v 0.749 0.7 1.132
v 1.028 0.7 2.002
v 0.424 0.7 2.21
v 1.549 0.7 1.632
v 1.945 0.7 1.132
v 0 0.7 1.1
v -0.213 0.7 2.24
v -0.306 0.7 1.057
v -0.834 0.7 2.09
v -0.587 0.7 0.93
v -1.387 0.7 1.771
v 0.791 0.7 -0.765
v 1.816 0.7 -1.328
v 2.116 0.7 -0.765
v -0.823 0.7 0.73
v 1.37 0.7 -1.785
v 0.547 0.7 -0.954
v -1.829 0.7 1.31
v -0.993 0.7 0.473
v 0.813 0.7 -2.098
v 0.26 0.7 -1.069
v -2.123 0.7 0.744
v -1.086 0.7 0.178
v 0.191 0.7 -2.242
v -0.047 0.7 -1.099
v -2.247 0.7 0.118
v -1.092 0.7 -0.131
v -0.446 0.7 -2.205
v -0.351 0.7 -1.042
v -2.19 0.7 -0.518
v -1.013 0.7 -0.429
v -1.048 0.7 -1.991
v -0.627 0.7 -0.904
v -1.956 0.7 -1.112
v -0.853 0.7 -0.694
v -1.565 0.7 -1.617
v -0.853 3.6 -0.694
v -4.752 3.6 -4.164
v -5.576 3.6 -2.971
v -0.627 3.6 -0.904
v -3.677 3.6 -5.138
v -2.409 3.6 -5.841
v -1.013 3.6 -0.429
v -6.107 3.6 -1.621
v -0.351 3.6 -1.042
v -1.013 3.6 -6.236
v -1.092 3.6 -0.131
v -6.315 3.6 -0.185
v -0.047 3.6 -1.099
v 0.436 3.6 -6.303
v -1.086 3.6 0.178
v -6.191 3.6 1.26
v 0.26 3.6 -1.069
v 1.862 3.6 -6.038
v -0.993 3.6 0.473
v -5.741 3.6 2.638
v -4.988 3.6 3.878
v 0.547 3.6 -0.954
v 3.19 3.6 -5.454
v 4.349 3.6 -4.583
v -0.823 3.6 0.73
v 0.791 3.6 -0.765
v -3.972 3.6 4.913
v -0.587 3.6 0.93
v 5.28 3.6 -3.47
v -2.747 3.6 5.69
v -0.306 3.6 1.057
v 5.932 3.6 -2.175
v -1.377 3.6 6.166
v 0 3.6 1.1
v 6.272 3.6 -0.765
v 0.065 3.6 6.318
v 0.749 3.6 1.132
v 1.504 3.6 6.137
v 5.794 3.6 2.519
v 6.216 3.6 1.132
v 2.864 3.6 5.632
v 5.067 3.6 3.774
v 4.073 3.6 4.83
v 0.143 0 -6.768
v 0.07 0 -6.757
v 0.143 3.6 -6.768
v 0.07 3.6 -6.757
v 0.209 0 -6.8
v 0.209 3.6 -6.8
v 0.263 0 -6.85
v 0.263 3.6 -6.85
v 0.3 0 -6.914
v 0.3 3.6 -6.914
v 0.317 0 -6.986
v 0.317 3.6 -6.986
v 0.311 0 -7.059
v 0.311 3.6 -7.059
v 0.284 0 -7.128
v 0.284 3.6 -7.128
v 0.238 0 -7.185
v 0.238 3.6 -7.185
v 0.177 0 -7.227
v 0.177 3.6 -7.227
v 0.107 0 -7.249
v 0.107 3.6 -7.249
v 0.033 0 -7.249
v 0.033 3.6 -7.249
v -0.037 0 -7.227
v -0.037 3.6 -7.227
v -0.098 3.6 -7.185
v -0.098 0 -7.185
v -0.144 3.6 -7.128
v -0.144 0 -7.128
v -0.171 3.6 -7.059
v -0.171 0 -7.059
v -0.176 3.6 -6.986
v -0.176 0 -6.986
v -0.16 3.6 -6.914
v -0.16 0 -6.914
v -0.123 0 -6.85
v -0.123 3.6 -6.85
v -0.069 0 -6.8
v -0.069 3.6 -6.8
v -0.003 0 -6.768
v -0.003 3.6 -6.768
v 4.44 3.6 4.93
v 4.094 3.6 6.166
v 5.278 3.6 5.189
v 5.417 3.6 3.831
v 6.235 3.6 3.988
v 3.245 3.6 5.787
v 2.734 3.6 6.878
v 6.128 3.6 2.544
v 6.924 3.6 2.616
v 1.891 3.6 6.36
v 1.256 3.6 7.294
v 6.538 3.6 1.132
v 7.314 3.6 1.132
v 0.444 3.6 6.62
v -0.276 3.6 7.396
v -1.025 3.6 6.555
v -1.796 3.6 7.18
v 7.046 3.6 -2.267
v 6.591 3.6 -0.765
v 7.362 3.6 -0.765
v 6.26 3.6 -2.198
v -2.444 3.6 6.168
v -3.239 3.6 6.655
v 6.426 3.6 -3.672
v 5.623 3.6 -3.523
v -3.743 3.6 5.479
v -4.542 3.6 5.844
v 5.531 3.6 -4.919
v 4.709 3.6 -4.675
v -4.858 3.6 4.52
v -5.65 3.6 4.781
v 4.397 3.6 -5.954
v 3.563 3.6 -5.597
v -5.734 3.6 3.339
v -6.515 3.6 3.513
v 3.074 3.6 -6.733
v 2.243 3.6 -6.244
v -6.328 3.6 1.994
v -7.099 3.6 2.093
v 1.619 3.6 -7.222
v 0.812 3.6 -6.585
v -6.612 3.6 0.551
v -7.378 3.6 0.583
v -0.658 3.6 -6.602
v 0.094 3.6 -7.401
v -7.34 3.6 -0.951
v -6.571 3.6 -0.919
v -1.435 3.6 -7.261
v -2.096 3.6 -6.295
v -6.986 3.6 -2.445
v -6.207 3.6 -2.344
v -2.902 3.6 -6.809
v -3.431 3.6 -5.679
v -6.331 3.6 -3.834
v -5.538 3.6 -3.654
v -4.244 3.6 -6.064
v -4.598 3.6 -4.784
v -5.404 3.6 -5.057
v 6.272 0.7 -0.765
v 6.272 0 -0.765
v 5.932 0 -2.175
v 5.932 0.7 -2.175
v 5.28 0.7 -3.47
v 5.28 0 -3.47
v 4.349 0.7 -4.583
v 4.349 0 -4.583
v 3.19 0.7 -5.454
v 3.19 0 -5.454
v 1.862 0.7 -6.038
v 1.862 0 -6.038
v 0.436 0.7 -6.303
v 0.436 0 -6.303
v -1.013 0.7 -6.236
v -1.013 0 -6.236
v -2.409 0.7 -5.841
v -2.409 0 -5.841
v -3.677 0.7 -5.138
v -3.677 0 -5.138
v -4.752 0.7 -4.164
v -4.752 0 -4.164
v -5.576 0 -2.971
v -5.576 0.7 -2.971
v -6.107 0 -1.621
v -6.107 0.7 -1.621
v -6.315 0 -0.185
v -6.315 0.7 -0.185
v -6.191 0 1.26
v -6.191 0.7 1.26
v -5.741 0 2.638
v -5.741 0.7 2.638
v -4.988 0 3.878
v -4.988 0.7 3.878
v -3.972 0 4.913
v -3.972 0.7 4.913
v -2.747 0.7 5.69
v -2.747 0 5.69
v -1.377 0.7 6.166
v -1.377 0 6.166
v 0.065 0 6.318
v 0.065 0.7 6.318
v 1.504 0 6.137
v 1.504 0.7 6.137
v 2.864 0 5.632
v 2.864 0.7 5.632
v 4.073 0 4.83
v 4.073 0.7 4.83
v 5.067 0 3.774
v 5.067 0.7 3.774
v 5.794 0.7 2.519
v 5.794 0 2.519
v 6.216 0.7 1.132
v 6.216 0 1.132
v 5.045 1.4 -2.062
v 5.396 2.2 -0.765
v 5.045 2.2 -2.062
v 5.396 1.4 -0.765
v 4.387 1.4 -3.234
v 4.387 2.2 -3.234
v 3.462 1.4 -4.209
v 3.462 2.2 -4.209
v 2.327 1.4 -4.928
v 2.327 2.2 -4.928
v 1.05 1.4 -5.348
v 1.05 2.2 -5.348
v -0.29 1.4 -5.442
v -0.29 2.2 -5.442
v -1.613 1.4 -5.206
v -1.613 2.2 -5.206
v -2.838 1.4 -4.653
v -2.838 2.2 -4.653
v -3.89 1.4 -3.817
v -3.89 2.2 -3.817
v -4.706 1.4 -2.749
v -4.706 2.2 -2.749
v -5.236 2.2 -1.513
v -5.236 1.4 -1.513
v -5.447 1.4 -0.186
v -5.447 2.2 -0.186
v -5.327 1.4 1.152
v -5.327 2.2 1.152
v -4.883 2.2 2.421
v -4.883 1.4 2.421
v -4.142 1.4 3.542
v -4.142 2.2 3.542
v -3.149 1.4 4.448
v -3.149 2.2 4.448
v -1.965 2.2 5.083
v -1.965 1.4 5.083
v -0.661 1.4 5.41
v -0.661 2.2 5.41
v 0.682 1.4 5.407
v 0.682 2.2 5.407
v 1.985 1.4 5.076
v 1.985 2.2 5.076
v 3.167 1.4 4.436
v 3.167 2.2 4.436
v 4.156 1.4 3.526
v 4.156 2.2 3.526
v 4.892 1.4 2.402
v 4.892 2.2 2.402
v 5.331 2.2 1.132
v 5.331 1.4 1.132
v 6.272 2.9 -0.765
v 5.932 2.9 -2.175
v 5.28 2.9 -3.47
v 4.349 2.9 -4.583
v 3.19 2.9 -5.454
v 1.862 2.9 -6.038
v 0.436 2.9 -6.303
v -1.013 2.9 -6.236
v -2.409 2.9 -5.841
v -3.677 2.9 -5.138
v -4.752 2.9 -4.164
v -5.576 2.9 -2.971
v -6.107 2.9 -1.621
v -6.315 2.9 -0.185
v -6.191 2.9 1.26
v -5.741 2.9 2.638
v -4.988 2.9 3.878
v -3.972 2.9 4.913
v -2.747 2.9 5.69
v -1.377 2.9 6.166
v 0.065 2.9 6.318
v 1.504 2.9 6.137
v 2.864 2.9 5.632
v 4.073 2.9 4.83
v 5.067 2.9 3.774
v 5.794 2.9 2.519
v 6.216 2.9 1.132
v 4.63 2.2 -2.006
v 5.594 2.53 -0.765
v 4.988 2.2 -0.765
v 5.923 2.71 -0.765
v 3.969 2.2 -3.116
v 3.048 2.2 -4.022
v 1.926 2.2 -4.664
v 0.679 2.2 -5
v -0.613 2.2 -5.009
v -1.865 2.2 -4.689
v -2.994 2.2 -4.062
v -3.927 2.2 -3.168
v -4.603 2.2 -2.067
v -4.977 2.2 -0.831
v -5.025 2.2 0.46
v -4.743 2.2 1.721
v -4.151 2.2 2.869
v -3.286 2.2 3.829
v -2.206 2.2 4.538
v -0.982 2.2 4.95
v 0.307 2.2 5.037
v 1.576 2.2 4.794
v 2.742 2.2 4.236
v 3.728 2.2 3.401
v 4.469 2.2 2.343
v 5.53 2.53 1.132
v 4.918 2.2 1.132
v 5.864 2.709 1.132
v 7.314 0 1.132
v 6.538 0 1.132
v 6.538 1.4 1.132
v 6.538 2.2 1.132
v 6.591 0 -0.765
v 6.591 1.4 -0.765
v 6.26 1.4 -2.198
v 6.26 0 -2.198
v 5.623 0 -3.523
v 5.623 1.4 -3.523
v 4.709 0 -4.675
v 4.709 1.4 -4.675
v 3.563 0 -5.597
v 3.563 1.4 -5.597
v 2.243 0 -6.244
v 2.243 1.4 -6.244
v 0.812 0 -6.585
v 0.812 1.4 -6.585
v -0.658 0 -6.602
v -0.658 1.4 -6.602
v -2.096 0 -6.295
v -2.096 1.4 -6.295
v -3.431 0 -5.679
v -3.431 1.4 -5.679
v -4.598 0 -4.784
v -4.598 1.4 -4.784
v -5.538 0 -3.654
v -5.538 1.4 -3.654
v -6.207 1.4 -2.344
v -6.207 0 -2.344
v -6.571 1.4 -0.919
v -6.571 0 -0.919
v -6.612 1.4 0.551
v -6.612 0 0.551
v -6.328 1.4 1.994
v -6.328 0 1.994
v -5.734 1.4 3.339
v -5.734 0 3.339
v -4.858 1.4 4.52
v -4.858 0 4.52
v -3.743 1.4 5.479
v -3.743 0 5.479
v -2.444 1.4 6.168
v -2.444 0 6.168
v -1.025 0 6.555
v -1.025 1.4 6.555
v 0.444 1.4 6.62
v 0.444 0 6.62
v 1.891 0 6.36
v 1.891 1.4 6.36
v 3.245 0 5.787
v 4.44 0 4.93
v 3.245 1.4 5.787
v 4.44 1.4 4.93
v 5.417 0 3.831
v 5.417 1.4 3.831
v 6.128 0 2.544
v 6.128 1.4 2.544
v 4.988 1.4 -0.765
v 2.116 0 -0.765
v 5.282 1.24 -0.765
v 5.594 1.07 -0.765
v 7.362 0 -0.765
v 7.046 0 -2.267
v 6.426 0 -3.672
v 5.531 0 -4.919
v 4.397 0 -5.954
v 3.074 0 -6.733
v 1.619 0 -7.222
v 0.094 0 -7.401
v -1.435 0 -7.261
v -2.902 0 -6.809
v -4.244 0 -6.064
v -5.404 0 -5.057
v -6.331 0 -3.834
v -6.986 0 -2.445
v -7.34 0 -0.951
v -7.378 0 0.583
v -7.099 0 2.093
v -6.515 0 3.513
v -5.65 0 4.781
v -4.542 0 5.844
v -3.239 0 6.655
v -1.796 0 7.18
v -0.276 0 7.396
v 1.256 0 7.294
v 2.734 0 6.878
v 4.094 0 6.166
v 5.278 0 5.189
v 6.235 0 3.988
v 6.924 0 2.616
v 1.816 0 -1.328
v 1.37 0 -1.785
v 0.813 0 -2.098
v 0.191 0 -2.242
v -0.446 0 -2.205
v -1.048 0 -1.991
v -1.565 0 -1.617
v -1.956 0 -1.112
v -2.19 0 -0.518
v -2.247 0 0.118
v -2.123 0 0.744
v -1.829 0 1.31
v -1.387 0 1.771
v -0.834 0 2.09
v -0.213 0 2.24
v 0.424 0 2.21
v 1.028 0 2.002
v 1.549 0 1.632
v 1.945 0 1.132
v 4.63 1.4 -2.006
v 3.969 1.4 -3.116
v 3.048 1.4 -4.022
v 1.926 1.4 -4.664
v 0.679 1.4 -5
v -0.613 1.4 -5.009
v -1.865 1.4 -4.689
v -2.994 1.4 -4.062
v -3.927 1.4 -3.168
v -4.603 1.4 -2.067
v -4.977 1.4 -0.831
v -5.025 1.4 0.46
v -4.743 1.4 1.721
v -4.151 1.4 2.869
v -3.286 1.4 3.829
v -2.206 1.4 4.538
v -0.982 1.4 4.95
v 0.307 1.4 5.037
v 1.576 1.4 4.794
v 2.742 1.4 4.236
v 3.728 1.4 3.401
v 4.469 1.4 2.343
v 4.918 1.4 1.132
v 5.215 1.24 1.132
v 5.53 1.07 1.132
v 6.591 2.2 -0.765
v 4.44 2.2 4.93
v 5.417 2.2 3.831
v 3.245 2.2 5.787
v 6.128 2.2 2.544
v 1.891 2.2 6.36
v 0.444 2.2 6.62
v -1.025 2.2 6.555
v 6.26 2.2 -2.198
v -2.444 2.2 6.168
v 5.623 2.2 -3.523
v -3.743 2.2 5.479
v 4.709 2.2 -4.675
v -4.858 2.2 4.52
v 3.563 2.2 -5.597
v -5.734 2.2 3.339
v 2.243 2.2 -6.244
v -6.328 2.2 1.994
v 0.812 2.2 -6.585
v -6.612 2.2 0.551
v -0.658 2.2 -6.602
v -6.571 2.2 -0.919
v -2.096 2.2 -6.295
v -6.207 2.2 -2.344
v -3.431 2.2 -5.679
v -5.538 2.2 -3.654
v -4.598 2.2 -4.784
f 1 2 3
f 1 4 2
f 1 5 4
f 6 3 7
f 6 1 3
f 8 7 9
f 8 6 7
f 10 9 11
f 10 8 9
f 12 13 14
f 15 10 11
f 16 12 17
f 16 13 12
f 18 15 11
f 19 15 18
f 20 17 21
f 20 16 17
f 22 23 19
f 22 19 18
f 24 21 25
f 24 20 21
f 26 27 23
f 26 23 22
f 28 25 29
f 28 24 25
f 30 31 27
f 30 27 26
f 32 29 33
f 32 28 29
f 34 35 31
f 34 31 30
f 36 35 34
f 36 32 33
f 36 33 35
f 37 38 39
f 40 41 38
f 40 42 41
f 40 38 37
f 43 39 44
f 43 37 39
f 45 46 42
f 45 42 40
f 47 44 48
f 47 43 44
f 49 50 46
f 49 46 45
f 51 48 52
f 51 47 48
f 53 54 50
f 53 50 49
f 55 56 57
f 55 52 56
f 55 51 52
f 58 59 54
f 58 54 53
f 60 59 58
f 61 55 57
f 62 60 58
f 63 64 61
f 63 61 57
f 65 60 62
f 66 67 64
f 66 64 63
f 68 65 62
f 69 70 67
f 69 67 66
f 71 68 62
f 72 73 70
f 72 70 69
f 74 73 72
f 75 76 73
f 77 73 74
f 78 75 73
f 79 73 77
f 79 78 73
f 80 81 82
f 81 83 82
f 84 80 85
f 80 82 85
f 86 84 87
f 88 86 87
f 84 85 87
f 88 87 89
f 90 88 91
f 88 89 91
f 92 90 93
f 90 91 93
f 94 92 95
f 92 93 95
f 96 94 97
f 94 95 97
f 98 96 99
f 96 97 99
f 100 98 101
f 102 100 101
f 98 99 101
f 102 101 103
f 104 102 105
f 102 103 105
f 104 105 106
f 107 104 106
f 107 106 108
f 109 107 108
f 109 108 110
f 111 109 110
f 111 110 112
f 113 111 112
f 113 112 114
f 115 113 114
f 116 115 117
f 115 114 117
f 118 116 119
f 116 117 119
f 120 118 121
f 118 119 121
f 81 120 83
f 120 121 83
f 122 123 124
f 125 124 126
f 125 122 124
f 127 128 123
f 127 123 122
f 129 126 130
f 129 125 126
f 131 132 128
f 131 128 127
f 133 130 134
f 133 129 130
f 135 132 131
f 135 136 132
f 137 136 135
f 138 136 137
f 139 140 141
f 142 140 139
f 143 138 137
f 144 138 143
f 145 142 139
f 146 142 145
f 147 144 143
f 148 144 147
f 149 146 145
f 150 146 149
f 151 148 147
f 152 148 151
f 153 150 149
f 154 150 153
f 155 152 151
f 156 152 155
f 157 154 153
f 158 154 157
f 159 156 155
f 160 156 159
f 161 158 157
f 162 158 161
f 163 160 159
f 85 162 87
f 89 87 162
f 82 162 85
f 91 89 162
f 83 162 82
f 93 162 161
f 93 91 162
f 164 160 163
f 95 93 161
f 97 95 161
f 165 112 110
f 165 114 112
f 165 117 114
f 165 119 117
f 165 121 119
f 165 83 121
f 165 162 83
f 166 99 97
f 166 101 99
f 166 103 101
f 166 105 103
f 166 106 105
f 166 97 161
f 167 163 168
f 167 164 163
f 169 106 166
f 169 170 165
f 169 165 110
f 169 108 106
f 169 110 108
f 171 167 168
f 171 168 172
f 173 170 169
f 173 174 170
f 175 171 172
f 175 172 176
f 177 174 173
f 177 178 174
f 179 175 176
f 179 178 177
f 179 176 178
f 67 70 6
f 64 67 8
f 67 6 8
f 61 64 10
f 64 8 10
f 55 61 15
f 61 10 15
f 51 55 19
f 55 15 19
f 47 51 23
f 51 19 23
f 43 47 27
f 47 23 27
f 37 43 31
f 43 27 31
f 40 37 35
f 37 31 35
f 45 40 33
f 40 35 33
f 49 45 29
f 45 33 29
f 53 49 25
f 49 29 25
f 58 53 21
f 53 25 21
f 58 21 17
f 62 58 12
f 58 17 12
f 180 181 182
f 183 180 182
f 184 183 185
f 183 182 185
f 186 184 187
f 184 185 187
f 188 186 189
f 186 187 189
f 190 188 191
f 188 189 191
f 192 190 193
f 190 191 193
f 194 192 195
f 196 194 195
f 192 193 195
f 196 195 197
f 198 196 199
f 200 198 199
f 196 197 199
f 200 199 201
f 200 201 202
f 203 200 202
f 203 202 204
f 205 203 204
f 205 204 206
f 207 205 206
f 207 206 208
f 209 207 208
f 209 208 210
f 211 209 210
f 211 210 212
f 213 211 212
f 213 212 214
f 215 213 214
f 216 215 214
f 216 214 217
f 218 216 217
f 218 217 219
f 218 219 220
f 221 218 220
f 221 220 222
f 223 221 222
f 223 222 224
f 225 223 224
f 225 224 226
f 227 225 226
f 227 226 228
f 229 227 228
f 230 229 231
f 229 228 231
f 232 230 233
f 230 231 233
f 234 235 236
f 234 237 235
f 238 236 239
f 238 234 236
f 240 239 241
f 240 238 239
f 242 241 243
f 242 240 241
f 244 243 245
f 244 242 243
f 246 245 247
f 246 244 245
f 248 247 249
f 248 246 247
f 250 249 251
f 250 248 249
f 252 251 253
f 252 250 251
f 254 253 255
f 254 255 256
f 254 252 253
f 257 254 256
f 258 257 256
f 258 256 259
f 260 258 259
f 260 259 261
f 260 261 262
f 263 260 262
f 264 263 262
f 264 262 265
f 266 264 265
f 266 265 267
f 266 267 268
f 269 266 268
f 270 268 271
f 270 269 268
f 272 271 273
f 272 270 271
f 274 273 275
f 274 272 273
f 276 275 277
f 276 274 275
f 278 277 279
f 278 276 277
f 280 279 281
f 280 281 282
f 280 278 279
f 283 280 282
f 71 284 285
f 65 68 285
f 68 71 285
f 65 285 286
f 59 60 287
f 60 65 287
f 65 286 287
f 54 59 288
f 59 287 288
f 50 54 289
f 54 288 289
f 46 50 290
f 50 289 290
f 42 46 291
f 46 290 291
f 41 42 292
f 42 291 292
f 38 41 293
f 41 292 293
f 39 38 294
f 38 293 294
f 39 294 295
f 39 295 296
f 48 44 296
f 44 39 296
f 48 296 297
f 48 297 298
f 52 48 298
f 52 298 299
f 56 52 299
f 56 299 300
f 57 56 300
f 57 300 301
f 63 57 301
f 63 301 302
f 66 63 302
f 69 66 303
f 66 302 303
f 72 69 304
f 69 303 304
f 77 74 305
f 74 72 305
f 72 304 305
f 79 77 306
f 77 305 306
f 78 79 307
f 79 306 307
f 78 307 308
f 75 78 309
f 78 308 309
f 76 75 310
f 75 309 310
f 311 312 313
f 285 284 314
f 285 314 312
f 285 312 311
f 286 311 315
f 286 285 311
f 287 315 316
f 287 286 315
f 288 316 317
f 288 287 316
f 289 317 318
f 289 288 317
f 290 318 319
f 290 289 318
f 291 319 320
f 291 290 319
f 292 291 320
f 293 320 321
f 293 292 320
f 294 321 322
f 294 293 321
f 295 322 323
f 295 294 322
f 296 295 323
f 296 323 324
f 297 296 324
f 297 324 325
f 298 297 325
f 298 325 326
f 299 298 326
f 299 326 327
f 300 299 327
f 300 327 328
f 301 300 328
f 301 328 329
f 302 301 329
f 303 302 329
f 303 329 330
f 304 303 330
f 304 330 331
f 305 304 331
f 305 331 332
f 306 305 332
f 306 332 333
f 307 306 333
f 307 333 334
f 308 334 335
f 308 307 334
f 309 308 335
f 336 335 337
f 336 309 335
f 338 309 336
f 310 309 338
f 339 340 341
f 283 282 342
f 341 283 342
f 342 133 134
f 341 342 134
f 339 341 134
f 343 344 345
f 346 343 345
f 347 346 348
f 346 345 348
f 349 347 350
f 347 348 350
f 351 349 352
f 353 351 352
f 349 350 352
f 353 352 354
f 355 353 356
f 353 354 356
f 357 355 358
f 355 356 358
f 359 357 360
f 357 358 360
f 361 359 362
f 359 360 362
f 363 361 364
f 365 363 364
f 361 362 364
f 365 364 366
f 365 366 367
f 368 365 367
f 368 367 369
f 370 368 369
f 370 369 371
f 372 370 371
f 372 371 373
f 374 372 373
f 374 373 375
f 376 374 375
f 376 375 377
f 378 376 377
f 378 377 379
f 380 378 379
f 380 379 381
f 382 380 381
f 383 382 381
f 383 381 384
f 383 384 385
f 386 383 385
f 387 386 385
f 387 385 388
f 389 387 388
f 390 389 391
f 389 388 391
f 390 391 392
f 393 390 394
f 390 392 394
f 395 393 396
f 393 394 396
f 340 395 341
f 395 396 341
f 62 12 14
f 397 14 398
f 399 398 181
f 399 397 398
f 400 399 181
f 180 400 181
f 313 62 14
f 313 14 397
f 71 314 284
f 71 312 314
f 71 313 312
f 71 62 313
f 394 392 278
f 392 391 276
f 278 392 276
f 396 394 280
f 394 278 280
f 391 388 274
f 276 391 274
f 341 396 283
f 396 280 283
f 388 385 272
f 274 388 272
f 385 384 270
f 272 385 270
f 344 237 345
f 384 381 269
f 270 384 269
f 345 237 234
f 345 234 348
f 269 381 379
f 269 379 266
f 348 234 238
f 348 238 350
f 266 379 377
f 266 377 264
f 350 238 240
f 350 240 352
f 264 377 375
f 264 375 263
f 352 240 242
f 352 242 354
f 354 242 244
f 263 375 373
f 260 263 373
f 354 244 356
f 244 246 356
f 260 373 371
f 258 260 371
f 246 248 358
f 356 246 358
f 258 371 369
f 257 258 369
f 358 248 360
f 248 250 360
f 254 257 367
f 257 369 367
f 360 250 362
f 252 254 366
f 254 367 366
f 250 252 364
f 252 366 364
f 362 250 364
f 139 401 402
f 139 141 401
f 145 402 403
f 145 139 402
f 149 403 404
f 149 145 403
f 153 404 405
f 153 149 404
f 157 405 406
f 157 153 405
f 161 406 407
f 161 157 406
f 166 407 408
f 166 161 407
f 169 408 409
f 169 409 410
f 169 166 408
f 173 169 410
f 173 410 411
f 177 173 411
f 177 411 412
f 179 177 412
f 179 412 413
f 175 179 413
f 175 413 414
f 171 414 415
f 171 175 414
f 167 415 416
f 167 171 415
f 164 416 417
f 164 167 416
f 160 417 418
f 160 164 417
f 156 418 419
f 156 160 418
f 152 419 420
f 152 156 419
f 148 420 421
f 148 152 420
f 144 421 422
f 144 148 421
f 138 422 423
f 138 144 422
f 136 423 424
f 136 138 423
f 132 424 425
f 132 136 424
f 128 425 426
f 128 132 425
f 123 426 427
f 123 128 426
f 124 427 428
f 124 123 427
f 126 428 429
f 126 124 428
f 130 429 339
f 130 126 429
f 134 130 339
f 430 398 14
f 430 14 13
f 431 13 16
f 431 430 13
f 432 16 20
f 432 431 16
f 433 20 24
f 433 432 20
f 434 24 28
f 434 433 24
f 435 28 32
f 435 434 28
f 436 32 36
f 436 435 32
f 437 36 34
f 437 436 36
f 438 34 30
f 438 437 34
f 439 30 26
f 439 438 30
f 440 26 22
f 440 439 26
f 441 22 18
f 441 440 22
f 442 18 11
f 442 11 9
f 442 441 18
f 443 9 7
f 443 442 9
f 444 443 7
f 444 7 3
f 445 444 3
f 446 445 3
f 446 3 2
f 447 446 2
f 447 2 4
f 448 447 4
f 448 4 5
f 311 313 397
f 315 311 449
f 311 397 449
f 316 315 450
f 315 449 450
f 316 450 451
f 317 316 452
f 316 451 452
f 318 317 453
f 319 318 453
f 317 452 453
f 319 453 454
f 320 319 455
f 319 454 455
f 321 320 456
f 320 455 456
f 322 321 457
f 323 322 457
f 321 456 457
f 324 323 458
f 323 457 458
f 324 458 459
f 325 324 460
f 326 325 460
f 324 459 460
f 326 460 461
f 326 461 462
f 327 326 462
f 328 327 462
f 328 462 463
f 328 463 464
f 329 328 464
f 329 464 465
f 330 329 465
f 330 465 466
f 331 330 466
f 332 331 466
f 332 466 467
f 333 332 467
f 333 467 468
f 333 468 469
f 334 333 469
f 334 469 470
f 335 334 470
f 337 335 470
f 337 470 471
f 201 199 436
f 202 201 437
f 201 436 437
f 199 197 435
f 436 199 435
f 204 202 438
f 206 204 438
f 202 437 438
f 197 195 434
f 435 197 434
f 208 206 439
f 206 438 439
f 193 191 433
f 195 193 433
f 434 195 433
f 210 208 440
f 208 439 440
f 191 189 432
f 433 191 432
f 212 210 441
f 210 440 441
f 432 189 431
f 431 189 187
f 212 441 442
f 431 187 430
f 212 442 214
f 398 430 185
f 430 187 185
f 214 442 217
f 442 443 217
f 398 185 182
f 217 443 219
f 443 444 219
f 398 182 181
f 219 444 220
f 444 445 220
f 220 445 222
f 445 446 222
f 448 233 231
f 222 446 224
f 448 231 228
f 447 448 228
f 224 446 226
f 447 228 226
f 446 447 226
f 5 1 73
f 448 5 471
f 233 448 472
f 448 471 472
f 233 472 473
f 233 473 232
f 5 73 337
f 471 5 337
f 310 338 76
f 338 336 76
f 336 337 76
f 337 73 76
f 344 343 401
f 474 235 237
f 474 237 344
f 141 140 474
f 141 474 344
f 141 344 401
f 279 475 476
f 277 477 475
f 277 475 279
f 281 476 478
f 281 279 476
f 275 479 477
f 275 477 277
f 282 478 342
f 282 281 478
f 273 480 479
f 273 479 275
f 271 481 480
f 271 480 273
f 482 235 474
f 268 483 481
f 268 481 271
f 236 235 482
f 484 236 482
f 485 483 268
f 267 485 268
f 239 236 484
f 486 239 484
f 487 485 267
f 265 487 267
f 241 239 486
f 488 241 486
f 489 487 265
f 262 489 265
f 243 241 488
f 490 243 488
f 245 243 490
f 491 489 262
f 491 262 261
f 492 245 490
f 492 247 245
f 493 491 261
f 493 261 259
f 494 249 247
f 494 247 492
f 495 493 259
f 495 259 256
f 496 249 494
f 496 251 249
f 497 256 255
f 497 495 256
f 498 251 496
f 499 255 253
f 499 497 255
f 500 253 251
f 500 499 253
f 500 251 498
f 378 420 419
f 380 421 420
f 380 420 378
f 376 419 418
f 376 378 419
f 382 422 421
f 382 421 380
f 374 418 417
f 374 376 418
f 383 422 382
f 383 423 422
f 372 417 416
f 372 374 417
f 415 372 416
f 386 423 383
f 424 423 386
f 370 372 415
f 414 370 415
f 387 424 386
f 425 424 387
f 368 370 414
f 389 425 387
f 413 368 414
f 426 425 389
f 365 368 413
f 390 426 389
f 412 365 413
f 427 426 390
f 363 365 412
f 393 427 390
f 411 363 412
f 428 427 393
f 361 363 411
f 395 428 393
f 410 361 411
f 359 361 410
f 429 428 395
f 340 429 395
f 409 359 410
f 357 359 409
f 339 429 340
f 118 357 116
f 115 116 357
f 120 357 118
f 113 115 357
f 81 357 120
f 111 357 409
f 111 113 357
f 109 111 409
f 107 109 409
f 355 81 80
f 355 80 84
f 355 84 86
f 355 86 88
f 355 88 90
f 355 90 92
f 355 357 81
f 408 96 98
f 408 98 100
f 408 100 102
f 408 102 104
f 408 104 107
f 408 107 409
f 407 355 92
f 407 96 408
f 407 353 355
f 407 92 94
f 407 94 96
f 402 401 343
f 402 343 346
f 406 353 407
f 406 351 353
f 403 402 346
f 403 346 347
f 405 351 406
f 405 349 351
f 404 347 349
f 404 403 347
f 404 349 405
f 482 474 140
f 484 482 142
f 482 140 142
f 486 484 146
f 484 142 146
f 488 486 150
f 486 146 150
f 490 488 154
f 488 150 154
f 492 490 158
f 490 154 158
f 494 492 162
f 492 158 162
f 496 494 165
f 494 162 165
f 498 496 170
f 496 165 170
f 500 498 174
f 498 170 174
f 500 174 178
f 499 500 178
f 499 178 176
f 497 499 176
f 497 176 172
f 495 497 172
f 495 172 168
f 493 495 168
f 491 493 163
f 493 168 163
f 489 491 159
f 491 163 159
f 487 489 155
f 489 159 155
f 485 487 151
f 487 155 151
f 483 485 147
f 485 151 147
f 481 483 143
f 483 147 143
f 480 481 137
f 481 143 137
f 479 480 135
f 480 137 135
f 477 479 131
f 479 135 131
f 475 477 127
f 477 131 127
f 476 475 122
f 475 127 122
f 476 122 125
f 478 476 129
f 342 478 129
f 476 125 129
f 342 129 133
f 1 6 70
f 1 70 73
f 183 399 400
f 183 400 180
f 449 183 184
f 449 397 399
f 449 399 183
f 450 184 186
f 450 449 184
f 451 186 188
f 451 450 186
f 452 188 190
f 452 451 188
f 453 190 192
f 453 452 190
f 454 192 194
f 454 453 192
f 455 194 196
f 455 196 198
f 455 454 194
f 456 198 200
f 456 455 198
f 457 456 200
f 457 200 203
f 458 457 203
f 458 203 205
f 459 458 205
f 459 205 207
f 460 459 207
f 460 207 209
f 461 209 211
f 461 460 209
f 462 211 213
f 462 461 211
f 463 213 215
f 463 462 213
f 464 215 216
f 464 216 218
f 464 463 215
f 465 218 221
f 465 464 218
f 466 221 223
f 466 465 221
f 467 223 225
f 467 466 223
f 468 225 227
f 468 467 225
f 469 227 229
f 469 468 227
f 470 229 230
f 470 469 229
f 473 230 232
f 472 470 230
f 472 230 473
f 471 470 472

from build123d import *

# Parameters (mm, degrees)
SKETCH_1_R          = 6.318183566
SKETCH_1_R_2        = 2.25
EXTRUDE_1_DEPTH     = 0.7
SKETCH_3_R          = 5.046021061
EXTRUDE_2_DEPTH     = 0.8
SKETCH_4_R          = 6.318183566
SKETCH_5_R          = 6.318183566
EXTRUDE_3_DEPTH     = 0.7
SKETCH_6_R          = 1.1
CUT_EXTRUDE_1_DEPTH = 10.394088018
SKETCH_7_R          = 7.401501987
SKETCH_7_R_2        = 6.64605104
EXTRUDE_4_DEPTH     = 0.7
SKETCH_14_R         = 7.401501987
SKETCH_14_R_2       = 5.45
EXTRUDE_5_DEPTH     = 0.8
SKETCH_31_R         = 7.401501987
SKETCH_31_R_2       = 6.635
EXTRUDE_9_DEPTH     = 3.6
SKETCH_34_W         = 7.257495065
SKETCH_34_H         = 1.896430871
CUT_EXTRUDE_4_DEPTH = 12.069076896
CUT_EXTRUDE_5_DEPTH = 11.861605007
CUT_EXTRUDE_7_DEPTH = 5
SKETCH_38_R         = 0.247262234
CUT_EXTRUDE_9_DEPTH = 5


# Read off the part's stored shape, not the designer's step: 疊層拉伸1
with BuildPart() as part:
    # 草圖1 → 填料-伸長1 (new body)
    with BuildSketch(Plane(origin=(0, 0, 0), x_dir=(1, 0, 0), z_dir=(0, 1, 0))):
        with Locations(Location((0, 0, 0), (0, 0, 270))):
            Circle(SKETCH_1_R)
        with Locations(Location((0, 0, 0), (0, 0, 270))):
            Circle(SKETCH_1_R_2, mode=Mode.SUBTRACT)
    extrude(amount=EXTRUDE_1_DEPTH)

    # 疊層拉伸1 outline → 疊層拉伸1 (revolve)
    with BuildSketch(Plane.XY):
        Polygon((0, 1.4), (0, 0.7), (6.318183566, 0.7), (5.046021061, 1.4), align=None)
    revolve(axis=Axis((0, 0, 0), (0, 1, 0)))

    # 草圖3 → 填料-伸長2 (add)
    with BuildSketch(Plane(origin=(0, 1.4, 0), x_dir=(1, 0, 0), z_dir=(0, 1, 0))):
        with Locations(Location((0, 0, 0), (0, 0, 270))):
            Circle(SKETCH_3_R)
    extrude(amount=EXTRUDE_2_DEPTH)

    # 草圖4 → section 1 of loft_2
    with BuildSketch(Plane(origin=(0, 2.9, 0), x_dir=(1, 0, 0), z_dir=(0, 1, 0)), mode=Mode.PRIVATE) as loft_2_s1:
        Circle(SKETCH_4_R)
    # loft up to a face of the part (loft_2)
    loft([Face(Wire([part.edges().sort_by_distance((3.678391047, 2.2, -3.454239114))[0]])), loft_2_s1.sketch])

    # 草圖5 → 填料-伸長3 (add)
    with BuildSketch(Plane(origin=(0, 2.9, 0), x_dir=(1, 0, 0), z_dir=(0, 1, 0))):
        with Locations(Location((0, 0, 0), (0, 0, 270))):
            Circle(SKETCH_5_R)
    extrude(amount=EXTRUDE_3_DEPTH)

    # 草圖6 → 除料-伸長1 (cut, through all)
    with BuildSketch(Plane.XZ.offset(-0.7)):
        with Locations(Location((0, 0, 0), (0, 0, 270))):
            Circle(SKETCH_6_R)
    extrude(amount=-CUT_EXTRUDE_1_DEPTH, mode=Mode.SUBTRACT)


with BuildPart() as body_2:
    # 草圖7 → 填料-伸長4 (new body)
    with BuildSketch(Plane.XZ):
        with Locations(Location((0, 0, 0), (0, 0, 270))):
            Circle(SKETCH_7_R)
        with Locations(Location((0, 0, 0), (0, 0, 270))):
            Circle(SKETCH_7_R_2, mode=Mode.SUBTRACT)
    extrude(amount=-EXTRUDE_4_DEPTH)



with BuildPart() as body_3:
    # 草圖14 → 填料-伸長5 (new body)
    with BuildSketch(Plane(origin=(0, 1.4, 0), x_dir=(1, 0, 0), z_dir=(0, 1, 0))):
        with Locations(Location((0, 0, 0), (0, 0, 90))):
            Circle(SKETCH_14_R)
        with Locations(Location((0, 0, 0), (0, 0, 270))):
            Circle(SKETCH_14_R_2, mode=Mode.SUBTRACT)
    extrude(amount=EXTRUDE_5_DEPTH)


with BuildPart() as body_2_1:
    add(body_2.part)

    add(body_3.part)  # 填料-伸長9 merges body 3
    # 草圖31 → 填料-伸長9 (add)
    with BuildSketch(Plane(origin=(0, 3.6, 0), x_dir=(1, 0, 0), z_dir=(0, 1, 0))):
        with Locations(Location((0, 0, 0), (0, 0, 90))):
            Circle(SKETCH_31_R)
        with Locations(Location((0, 0, 0), (0, 0, 270))):
            Circle(SKETCH_31_R_2, mode=Mode.SUBTRACT)
    extrude(amount=-EXTRUDE_9_DEPTH)


with BuildPart() as cut_extrude_4_tool:
    # 草圖34 → 除料-伸長4 (new, through all)
    with BuildSketch(Plane(origin=(0, 3.6, 0), x_dir=(1, 0, 0), z_dir=(0, 1, 0))):
        with Locations((4.377250876, -0.183367649)):
            Rectangle(SKETCH_34_W, SKETCH_34_H)
    extrude(amount=-CUT_EXTRUDE_4_DEPTH)


with BuildPart() as part_1:
    add(part.part)

    # 除料-伸長4: cut by cut_extrude_4_tool
    add(cut_extrude_4_tool.part, mode=Mode.SUBTRACT)

    # 草圖35 → 除料-伸長5 (cut, through all)
    with BuildSketch(Plane.XZ.offset(-0.7)):
        Polygon((0.748503344, 1.131583084), (0.46388197, 0.910676659), (0.923529249, 0.707226224), align=None)
    extrude(amount=-CUT_EXTRUDE_5_DEPTH, mode=Mode.SUBTRACT)

    # 草圖36 → 除料-伸長7 (cut, symmetric)
    with BuildSketch(Plane(origin=(0, 1.4, 0), x_dir=(1, 0, 0), z_dir=(0, 1, 0))):
        Polygon((0, -1.1), (0.748503344, -1.131583084), (0.630994706, -0.920173616), align=None)
    extrude(amount=CUT_EXTRUDE_7_DEPTH, both=True, mode=Mode.SUBTRACT)


with BuildPart() as body_2_2:
    add(body_2_1.part)

    # 除料-伸長4: cut by cut_extrude_4_tool
    add(cut_extrude_4_tool.part, mode=Mode.SUBTRACT)

    # 草圖38 → 除料-伸長9 (cut, symmetric)
    with BuildSketch(Plane(origin=(0, 3.6, 0), x_dir=(1, 0, 0), z_dir=(0, 1, 0))):
        with Locations(Location((0.070137897, 7.004124097, 0), (0, 0, 270))):
            Circle(SKETCH_38_R)
    extrude(amount=CUT_EXTRUDE_9_DEPTH, both=True, mode=Mode.SUBTRACT)


solid = Compound([part_1.part, body_2_2.part])
